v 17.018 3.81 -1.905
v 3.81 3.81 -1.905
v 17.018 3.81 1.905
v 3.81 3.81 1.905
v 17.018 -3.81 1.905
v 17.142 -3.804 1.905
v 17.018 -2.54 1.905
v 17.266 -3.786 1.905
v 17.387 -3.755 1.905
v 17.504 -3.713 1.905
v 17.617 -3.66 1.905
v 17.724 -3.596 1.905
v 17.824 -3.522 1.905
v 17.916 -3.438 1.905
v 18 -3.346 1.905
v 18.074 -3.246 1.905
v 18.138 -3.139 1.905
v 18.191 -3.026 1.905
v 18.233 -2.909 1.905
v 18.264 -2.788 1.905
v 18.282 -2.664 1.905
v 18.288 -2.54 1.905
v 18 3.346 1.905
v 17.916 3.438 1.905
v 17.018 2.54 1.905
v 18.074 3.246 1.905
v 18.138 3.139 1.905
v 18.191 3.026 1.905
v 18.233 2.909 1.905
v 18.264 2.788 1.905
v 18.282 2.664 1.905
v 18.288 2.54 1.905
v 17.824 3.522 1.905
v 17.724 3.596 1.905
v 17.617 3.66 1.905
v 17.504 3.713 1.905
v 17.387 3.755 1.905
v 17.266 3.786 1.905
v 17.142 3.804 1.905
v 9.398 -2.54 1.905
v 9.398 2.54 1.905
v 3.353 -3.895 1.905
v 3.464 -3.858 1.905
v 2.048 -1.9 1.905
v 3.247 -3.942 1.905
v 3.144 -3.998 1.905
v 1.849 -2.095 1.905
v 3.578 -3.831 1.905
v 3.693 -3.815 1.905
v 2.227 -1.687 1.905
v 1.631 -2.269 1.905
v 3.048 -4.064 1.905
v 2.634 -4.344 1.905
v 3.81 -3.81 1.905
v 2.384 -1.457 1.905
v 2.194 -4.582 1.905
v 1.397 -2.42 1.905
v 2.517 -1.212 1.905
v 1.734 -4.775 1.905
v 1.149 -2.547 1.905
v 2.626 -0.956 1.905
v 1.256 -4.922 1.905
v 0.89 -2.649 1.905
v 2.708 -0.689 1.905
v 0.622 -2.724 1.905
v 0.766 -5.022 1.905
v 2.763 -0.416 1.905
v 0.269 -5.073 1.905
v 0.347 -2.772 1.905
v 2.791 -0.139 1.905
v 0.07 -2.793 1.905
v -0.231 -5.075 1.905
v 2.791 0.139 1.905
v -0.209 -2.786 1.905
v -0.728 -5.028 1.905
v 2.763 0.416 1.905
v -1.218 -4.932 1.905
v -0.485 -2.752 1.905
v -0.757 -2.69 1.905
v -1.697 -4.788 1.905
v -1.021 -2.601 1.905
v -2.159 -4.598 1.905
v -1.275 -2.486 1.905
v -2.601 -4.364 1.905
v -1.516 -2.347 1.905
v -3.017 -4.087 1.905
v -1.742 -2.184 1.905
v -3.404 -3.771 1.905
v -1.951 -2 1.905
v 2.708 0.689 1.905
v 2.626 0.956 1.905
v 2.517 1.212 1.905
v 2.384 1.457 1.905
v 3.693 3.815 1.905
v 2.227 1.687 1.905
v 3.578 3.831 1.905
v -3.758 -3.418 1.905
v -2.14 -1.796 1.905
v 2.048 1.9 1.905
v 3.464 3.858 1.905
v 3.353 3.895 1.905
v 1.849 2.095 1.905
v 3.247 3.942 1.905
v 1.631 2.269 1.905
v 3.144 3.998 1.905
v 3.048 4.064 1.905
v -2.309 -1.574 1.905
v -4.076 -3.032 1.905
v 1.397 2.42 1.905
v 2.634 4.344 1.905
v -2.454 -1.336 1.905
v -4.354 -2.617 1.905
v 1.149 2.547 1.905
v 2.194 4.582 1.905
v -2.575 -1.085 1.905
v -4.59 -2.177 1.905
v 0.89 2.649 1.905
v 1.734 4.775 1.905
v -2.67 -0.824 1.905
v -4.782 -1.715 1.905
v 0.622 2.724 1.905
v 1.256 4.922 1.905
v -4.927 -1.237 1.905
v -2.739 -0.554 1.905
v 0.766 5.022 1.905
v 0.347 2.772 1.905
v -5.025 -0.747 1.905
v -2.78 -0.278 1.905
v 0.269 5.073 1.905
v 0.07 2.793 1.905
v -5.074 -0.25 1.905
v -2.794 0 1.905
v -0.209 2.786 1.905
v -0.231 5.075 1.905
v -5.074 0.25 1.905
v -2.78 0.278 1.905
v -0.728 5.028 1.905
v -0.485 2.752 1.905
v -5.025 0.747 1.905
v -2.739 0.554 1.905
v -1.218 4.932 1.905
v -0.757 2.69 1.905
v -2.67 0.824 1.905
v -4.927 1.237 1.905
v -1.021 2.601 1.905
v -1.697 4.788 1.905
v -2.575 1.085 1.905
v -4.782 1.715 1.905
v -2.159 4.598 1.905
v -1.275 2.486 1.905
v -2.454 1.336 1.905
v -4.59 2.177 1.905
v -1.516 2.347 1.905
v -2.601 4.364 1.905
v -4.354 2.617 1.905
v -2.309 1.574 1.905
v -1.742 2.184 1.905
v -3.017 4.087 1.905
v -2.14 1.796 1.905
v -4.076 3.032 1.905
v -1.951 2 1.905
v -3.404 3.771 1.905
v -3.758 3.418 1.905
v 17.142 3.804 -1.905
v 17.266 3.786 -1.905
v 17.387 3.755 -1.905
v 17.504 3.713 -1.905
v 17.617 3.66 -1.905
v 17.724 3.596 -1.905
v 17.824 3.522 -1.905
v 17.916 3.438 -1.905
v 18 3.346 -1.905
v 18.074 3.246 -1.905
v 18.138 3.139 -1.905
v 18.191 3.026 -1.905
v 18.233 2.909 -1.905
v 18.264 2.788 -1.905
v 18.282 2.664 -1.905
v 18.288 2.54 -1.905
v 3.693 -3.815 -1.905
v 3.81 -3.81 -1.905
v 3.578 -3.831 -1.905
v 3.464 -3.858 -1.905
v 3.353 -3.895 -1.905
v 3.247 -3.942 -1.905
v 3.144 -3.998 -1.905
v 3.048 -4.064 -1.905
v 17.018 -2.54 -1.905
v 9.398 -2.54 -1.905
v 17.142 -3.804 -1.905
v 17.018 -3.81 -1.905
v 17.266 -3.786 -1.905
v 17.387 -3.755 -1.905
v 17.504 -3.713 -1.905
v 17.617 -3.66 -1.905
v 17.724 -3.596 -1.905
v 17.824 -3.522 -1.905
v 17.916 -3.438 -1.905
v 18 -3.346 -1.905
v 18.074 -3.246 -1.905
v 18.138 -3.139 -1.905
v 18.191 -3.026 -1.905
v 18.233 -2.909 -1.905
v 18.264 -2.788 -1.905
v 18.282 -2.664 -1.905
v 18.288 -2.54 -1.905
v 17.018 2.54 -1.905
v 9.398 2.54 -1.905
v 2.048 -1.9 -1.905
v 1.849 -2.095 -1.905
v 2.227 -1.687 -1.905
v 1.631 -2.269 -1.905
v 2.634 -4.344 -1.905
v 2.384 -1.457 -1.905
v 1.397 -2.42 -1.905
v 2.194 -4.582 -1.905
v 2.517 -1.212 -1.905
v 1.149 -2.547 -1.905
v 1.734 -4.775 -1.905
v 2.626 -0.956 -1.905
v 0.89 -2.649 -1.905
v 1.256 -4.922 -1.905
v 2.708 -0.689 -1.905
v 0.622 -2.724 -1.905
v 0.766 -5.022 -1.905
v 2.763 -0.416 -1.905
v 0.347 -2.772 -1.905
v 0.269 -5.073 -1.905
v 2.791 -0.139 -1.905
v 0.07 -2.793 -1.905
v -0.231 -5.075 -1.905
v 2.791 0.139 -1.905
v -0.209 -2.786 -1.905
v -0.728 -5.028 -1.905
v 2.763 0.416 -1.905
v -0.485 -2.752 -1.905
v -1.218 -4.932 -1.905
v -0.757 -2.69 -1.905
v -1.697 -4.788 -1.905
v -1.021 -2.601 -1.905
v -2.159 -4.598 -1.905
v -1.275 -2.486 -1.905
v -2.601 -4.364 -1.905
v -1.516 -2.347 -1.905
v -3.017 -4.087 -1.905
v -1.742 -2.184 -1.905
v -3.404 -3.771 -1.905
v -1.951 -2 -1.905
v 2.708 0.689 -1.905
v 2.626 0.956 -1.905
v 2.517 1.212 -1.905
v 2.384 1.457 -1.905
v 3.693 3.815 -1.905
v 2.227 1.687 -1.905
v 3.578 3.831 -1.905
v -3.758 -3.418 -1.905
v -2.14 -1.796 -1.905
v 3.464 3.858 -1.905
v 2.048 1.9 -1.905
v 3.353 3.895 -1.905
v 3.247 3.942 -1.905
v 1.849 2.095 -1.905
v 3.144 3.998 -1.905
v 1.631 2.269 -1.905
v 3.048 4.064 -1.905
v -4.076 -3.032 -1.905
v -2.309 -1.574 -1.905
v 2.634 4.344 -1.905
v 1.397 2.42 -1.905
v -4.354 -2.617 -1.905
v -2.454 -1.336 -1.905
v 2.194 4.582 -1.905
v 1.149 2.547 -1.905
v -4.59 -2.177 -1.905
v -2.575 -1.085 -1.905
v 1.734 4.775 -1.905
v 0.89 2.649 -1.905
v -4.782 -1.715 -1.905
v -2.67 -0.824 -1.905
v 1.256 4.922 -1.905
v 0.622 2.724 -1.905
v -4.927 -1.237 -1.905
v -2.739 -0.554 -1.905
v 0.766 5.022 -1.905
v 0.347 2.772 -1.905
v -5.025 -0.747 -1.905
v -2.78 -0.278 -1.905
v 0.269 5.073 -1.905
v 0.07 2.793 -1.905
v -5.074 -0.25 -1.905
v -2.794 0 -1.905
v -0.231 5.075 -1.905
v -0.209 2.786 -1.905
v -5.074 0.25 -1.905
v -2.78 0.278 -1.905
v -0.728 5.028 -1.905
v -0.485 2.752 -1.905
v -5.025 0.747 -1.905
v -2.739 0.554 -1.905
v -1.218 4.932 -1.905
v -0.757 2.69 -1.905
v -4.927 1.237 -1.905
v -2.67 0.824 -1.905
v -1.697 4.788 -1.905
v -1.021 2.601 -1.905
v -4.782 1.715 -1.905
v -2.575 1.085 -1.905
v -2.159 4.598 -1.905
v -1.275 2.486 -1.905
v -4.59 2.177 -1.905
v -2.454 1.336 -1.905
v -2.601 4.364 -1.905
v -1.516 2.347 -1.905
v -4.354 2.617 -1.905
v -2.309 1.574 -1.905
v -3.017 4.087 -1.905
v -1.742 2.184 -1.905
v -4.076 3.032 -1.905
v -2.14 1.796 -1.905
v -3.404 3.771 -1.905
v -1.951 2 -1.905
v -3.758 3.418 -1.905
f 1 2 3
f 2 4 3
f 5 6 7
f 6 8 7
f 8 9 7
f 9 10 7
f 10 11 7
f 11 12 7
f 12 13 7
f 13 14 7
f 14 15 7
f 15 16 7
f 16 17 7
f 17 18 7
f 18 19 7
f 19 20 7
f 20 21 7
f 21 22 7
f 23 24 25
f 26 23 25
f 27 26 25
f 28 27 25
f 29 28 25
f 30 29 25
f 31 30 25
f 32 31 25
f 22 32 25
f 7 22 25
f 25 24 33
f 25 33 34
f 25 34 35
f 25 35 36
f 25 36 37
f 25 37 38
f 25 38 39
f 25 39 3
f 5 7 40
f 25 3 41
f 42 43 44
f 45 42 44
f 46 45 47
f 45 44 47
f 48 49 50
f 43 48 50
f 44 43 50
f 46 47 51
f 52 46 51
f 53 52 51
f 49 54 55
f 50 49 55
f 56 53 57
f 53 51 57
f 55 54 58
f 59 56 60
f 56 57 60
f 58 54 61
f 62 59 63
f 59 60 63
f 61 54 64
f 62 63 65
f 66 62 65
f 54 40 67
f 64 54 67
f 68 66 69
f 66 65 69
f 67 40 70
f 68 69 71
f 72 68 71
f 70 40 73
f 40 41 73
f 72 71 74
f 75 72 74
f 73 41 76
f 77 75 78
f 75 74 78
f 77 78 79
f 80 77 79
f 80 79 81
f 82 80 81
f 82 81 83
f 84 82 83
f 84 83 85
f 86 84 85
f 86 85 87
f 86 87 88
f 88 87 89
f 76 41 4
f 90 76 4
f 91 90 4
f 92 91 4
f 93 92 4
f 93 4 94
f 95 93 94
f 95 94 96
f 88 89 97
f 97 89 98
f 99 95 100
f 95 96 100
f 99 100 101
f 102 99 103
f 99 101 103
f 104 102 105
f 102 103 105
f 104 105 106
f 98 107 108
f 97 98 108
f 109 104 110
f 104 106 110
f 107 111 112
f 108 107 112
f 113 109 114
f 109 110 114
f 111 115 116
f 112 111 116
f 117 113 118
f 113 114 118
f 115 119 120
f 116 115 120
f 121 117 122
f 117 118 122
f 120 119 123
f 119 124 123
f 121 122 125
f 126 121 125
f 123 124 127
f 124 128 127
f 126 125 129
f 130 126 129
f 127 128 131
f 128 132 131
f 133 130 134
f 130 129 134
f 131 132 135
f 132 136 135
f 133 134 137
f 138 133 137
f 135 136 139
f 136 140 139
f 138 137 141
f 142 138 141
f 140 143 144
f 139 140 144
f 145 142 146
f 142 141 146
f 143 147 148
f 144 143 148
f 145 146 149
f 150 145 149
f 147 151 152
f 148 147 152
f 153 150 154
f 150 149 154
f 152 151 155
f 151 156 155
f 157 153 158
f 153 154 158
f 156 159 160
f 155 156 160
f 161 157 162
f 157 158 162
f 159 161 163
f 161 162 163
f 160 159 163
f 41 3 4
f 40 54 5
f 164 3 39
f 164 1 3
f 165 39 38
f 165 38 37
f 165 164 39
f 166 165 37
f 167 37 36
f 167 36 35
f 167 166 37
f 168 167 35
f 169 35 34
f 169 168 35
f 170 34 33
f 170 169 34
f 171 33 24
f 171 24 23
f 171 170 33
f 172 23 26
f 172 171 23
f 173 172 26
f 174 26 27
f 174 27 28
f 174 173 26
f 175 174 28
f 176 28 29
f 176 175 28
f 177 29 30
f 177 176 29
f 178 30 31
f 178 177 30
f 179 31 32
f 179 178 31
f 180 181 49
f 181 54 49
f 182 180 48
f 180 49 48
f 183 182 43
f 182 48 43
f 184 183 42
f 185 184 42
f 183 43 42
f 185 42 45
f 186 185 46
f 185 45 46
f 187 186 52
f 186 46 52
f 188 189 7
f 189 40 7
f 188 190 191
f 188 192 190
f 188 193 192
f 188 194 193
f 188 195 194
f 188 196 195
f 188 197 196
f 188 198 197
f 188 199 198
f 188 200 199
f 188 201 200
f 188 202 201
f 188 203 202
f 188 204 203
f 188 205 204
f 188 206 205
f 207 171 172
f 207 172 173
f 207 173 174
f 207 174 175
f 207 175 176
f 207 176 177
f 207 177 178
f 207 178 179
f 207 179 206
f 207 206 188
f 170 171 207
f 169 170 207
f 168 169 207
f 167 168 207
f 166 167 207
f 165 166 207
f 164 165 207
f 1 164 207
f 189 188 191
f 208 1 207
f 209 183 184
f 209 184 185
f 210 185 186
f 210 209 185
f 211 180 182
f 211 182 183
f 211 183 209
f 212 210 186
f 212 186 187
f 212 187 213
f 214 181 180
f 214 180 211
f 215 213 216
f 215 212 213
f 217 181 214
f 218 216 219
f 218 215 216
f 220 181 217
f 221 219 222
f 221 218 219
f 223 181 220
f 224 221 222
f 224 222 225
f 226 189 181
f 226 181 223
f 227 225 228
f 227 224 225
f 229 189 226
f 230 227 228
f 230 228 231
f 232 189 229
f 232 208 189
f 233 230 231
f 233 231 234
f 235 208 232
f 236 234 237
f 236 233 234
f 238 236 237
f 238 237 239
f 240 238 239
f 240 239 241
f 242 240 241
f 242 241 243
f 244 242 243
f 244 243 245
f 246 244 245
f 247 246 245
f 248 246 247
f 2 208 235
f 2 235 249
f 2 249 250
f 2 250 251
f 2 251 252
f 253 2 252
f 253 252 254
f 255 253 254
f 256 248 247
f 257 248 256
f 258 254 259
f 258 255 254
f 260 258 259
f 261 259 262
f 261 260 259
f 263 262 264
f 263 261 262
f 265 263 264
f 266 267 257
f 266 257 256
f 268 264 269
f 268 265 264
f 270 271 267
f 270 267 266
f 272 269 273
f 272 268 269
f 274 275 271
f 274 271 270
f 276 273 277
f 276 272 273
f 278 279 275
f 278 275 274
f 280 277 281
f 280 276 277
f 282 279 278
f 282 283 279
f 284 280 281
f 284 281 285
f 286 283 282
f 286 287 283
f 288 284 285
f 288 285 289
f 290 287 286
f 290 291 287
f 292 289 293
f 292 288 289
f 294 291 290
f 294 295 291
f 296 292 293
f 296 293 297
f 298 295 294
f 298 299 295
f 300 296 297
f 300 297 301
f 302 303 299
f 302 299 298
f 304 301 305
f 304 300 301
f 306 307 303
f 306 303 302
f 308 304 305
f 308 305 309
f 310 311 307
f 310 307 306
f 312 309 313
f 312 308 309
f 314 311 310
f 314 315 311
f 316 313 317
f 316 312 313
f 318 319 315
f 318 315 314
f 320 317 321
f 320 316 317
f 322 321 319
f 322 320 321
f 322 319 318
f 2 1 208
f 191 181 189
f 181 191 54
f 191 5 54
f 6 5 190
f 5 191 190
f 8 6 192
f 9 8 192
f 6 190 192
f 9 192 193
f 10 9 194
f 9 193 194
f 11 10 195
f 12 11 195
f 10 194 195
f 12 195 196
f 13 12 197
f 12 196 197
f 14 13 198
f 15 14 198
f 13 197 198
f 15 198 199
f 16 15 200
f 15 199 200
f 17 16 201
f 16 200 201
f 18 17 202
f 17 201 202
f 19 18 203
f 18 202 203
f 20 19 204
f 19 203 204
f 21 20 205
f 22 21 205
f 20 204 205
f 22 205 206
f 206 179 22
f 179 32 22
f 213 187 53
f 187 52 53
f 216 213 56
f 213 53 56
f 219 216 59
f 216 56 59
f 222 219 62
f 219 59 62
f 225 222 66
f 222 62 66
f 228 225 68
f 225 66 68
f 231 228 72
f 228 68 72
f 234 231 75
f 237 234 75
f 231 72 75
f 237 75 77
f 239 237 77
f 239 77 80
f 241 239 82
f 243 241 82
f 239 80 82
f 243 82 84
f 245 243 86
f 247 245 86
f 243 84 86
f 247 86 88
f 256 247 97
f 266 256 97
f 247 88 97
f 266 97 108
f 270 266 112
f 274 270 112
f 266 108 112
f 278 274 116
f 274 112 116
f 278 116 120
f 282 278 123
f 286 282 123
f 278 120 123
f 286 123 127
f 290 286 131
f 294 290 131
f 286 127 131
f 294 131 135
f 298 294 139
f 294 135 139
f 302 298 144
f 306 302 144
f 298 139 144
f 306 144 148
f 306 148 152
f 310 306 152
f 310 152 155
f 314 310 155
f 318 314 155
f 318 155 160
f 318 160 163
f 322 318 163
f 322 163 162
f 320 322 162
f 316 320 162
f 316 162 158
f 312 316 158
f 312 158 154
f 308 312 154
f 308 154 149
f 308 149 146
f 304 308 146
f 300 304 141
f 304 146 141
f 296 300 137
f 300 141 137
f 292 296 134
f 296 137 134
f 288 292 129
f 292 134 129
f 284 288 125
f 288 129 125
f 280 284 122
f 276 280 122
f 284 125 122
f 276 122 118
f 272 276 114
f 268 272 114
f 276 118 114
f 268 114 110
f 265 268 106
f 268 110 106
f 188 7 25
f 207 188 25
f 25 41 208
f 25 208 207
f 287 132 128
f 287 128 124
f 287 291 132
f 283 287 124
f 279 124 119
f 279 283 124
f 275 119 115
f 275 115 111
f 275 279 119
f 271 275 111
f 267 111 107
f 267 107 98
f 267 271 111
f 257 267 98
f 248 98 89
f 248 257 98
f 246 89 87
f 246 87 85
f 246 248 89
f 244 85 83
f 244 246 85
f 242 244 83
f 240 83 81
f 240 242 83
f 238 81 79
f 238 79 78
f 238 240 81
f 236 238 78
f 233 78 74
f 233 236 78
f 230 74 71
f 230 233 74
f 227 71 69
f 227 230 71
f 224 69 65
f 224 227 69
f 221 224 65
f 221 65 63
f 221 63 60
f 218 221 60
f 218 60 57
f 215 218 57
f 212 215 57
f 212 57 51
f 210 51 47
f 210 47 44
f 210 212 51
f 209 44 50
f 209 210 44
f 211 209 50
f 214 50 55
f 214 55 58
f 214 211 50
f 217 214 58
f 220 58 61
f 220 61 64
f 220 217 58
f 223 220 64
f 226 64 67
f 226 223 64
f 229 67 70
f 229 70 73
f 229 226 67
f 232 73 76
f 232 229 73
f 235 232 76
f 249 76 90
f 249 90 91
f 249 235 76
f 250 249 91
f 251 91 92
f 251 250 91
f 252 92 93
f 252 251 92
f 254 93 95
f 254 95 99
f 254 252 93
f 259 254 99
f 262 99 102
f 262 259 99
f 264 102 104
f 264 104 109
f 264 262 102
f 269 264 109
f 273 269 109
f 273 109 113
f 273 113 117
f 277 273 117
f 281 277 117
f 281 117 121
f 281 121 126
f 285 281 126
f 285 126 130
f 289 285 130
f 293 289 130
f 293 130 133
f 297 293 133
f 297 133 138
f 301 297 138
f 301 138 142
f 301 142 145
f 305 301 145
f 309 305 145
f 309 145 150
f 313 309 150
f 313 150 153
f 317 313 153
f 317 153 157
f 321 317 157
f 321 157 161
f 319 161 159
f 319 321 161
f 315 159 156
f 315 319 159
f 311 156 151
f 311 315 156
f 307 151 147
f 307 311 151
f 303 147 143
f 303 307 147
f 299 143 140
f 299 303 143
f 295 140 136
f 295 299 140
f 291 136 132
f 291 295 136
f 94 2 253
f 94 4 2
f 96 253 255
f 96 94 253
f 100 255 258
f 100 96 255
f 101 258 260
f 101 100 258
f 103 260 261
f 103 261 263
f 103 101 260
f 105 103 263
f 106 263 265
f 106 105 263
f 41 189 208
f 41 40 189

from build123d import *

# Parameters (mm, degrees)
SKETCH1_R           = 2.794
SKETCH1_W           = 7.62
SKETCH1_H           = 5.08
BOSS_EXTRUDE1_DEPTH = 1.905
FILLET1_R           = 1.27


with BuildPart() as part:
    # Sketch1 → Boss-Extrude1 (new, symmetric)
    with BuildSketch(Plane.XY):
        with BuildLine():
            Line((3.360104165, 3.81), (18.288, 3.81))
            Line((18.288, 3.81), (18.288, -3.81))
            Line((18.288, -3.81), (3.360104165, -3.81))
            ThreePointArc((3.360104165, -3.81), (-5.08, 0), (3.360104165, 3.81))
        make_face()
        with Locations(Location((0, 0, 0), (0, 0, 180))):
            Circle(SKETCH1_R, mode=Mode.SUBTRACT)
        with Locations((13.208, 0)):
            Rectangle(SKETCH1_W, SKETCH1_H, mode=Mode.SUBTRACT)
    extrude(amount=BOSS_EXTRUDE1_DEPTH, both=True)

    # Fillet1
    fillet1_edges = [part.edges().sort_by_distance(p)[0] for p in [
        (3.360104165, 3.81, 0),
        (18.288, 3.81, 0),
        (18.288, -3.81, 0),
        (3.360104165, -3.81, 0),
    ]]
    fillet(fillet1_edges, radius=FILLET1_R)


solid = part.part
